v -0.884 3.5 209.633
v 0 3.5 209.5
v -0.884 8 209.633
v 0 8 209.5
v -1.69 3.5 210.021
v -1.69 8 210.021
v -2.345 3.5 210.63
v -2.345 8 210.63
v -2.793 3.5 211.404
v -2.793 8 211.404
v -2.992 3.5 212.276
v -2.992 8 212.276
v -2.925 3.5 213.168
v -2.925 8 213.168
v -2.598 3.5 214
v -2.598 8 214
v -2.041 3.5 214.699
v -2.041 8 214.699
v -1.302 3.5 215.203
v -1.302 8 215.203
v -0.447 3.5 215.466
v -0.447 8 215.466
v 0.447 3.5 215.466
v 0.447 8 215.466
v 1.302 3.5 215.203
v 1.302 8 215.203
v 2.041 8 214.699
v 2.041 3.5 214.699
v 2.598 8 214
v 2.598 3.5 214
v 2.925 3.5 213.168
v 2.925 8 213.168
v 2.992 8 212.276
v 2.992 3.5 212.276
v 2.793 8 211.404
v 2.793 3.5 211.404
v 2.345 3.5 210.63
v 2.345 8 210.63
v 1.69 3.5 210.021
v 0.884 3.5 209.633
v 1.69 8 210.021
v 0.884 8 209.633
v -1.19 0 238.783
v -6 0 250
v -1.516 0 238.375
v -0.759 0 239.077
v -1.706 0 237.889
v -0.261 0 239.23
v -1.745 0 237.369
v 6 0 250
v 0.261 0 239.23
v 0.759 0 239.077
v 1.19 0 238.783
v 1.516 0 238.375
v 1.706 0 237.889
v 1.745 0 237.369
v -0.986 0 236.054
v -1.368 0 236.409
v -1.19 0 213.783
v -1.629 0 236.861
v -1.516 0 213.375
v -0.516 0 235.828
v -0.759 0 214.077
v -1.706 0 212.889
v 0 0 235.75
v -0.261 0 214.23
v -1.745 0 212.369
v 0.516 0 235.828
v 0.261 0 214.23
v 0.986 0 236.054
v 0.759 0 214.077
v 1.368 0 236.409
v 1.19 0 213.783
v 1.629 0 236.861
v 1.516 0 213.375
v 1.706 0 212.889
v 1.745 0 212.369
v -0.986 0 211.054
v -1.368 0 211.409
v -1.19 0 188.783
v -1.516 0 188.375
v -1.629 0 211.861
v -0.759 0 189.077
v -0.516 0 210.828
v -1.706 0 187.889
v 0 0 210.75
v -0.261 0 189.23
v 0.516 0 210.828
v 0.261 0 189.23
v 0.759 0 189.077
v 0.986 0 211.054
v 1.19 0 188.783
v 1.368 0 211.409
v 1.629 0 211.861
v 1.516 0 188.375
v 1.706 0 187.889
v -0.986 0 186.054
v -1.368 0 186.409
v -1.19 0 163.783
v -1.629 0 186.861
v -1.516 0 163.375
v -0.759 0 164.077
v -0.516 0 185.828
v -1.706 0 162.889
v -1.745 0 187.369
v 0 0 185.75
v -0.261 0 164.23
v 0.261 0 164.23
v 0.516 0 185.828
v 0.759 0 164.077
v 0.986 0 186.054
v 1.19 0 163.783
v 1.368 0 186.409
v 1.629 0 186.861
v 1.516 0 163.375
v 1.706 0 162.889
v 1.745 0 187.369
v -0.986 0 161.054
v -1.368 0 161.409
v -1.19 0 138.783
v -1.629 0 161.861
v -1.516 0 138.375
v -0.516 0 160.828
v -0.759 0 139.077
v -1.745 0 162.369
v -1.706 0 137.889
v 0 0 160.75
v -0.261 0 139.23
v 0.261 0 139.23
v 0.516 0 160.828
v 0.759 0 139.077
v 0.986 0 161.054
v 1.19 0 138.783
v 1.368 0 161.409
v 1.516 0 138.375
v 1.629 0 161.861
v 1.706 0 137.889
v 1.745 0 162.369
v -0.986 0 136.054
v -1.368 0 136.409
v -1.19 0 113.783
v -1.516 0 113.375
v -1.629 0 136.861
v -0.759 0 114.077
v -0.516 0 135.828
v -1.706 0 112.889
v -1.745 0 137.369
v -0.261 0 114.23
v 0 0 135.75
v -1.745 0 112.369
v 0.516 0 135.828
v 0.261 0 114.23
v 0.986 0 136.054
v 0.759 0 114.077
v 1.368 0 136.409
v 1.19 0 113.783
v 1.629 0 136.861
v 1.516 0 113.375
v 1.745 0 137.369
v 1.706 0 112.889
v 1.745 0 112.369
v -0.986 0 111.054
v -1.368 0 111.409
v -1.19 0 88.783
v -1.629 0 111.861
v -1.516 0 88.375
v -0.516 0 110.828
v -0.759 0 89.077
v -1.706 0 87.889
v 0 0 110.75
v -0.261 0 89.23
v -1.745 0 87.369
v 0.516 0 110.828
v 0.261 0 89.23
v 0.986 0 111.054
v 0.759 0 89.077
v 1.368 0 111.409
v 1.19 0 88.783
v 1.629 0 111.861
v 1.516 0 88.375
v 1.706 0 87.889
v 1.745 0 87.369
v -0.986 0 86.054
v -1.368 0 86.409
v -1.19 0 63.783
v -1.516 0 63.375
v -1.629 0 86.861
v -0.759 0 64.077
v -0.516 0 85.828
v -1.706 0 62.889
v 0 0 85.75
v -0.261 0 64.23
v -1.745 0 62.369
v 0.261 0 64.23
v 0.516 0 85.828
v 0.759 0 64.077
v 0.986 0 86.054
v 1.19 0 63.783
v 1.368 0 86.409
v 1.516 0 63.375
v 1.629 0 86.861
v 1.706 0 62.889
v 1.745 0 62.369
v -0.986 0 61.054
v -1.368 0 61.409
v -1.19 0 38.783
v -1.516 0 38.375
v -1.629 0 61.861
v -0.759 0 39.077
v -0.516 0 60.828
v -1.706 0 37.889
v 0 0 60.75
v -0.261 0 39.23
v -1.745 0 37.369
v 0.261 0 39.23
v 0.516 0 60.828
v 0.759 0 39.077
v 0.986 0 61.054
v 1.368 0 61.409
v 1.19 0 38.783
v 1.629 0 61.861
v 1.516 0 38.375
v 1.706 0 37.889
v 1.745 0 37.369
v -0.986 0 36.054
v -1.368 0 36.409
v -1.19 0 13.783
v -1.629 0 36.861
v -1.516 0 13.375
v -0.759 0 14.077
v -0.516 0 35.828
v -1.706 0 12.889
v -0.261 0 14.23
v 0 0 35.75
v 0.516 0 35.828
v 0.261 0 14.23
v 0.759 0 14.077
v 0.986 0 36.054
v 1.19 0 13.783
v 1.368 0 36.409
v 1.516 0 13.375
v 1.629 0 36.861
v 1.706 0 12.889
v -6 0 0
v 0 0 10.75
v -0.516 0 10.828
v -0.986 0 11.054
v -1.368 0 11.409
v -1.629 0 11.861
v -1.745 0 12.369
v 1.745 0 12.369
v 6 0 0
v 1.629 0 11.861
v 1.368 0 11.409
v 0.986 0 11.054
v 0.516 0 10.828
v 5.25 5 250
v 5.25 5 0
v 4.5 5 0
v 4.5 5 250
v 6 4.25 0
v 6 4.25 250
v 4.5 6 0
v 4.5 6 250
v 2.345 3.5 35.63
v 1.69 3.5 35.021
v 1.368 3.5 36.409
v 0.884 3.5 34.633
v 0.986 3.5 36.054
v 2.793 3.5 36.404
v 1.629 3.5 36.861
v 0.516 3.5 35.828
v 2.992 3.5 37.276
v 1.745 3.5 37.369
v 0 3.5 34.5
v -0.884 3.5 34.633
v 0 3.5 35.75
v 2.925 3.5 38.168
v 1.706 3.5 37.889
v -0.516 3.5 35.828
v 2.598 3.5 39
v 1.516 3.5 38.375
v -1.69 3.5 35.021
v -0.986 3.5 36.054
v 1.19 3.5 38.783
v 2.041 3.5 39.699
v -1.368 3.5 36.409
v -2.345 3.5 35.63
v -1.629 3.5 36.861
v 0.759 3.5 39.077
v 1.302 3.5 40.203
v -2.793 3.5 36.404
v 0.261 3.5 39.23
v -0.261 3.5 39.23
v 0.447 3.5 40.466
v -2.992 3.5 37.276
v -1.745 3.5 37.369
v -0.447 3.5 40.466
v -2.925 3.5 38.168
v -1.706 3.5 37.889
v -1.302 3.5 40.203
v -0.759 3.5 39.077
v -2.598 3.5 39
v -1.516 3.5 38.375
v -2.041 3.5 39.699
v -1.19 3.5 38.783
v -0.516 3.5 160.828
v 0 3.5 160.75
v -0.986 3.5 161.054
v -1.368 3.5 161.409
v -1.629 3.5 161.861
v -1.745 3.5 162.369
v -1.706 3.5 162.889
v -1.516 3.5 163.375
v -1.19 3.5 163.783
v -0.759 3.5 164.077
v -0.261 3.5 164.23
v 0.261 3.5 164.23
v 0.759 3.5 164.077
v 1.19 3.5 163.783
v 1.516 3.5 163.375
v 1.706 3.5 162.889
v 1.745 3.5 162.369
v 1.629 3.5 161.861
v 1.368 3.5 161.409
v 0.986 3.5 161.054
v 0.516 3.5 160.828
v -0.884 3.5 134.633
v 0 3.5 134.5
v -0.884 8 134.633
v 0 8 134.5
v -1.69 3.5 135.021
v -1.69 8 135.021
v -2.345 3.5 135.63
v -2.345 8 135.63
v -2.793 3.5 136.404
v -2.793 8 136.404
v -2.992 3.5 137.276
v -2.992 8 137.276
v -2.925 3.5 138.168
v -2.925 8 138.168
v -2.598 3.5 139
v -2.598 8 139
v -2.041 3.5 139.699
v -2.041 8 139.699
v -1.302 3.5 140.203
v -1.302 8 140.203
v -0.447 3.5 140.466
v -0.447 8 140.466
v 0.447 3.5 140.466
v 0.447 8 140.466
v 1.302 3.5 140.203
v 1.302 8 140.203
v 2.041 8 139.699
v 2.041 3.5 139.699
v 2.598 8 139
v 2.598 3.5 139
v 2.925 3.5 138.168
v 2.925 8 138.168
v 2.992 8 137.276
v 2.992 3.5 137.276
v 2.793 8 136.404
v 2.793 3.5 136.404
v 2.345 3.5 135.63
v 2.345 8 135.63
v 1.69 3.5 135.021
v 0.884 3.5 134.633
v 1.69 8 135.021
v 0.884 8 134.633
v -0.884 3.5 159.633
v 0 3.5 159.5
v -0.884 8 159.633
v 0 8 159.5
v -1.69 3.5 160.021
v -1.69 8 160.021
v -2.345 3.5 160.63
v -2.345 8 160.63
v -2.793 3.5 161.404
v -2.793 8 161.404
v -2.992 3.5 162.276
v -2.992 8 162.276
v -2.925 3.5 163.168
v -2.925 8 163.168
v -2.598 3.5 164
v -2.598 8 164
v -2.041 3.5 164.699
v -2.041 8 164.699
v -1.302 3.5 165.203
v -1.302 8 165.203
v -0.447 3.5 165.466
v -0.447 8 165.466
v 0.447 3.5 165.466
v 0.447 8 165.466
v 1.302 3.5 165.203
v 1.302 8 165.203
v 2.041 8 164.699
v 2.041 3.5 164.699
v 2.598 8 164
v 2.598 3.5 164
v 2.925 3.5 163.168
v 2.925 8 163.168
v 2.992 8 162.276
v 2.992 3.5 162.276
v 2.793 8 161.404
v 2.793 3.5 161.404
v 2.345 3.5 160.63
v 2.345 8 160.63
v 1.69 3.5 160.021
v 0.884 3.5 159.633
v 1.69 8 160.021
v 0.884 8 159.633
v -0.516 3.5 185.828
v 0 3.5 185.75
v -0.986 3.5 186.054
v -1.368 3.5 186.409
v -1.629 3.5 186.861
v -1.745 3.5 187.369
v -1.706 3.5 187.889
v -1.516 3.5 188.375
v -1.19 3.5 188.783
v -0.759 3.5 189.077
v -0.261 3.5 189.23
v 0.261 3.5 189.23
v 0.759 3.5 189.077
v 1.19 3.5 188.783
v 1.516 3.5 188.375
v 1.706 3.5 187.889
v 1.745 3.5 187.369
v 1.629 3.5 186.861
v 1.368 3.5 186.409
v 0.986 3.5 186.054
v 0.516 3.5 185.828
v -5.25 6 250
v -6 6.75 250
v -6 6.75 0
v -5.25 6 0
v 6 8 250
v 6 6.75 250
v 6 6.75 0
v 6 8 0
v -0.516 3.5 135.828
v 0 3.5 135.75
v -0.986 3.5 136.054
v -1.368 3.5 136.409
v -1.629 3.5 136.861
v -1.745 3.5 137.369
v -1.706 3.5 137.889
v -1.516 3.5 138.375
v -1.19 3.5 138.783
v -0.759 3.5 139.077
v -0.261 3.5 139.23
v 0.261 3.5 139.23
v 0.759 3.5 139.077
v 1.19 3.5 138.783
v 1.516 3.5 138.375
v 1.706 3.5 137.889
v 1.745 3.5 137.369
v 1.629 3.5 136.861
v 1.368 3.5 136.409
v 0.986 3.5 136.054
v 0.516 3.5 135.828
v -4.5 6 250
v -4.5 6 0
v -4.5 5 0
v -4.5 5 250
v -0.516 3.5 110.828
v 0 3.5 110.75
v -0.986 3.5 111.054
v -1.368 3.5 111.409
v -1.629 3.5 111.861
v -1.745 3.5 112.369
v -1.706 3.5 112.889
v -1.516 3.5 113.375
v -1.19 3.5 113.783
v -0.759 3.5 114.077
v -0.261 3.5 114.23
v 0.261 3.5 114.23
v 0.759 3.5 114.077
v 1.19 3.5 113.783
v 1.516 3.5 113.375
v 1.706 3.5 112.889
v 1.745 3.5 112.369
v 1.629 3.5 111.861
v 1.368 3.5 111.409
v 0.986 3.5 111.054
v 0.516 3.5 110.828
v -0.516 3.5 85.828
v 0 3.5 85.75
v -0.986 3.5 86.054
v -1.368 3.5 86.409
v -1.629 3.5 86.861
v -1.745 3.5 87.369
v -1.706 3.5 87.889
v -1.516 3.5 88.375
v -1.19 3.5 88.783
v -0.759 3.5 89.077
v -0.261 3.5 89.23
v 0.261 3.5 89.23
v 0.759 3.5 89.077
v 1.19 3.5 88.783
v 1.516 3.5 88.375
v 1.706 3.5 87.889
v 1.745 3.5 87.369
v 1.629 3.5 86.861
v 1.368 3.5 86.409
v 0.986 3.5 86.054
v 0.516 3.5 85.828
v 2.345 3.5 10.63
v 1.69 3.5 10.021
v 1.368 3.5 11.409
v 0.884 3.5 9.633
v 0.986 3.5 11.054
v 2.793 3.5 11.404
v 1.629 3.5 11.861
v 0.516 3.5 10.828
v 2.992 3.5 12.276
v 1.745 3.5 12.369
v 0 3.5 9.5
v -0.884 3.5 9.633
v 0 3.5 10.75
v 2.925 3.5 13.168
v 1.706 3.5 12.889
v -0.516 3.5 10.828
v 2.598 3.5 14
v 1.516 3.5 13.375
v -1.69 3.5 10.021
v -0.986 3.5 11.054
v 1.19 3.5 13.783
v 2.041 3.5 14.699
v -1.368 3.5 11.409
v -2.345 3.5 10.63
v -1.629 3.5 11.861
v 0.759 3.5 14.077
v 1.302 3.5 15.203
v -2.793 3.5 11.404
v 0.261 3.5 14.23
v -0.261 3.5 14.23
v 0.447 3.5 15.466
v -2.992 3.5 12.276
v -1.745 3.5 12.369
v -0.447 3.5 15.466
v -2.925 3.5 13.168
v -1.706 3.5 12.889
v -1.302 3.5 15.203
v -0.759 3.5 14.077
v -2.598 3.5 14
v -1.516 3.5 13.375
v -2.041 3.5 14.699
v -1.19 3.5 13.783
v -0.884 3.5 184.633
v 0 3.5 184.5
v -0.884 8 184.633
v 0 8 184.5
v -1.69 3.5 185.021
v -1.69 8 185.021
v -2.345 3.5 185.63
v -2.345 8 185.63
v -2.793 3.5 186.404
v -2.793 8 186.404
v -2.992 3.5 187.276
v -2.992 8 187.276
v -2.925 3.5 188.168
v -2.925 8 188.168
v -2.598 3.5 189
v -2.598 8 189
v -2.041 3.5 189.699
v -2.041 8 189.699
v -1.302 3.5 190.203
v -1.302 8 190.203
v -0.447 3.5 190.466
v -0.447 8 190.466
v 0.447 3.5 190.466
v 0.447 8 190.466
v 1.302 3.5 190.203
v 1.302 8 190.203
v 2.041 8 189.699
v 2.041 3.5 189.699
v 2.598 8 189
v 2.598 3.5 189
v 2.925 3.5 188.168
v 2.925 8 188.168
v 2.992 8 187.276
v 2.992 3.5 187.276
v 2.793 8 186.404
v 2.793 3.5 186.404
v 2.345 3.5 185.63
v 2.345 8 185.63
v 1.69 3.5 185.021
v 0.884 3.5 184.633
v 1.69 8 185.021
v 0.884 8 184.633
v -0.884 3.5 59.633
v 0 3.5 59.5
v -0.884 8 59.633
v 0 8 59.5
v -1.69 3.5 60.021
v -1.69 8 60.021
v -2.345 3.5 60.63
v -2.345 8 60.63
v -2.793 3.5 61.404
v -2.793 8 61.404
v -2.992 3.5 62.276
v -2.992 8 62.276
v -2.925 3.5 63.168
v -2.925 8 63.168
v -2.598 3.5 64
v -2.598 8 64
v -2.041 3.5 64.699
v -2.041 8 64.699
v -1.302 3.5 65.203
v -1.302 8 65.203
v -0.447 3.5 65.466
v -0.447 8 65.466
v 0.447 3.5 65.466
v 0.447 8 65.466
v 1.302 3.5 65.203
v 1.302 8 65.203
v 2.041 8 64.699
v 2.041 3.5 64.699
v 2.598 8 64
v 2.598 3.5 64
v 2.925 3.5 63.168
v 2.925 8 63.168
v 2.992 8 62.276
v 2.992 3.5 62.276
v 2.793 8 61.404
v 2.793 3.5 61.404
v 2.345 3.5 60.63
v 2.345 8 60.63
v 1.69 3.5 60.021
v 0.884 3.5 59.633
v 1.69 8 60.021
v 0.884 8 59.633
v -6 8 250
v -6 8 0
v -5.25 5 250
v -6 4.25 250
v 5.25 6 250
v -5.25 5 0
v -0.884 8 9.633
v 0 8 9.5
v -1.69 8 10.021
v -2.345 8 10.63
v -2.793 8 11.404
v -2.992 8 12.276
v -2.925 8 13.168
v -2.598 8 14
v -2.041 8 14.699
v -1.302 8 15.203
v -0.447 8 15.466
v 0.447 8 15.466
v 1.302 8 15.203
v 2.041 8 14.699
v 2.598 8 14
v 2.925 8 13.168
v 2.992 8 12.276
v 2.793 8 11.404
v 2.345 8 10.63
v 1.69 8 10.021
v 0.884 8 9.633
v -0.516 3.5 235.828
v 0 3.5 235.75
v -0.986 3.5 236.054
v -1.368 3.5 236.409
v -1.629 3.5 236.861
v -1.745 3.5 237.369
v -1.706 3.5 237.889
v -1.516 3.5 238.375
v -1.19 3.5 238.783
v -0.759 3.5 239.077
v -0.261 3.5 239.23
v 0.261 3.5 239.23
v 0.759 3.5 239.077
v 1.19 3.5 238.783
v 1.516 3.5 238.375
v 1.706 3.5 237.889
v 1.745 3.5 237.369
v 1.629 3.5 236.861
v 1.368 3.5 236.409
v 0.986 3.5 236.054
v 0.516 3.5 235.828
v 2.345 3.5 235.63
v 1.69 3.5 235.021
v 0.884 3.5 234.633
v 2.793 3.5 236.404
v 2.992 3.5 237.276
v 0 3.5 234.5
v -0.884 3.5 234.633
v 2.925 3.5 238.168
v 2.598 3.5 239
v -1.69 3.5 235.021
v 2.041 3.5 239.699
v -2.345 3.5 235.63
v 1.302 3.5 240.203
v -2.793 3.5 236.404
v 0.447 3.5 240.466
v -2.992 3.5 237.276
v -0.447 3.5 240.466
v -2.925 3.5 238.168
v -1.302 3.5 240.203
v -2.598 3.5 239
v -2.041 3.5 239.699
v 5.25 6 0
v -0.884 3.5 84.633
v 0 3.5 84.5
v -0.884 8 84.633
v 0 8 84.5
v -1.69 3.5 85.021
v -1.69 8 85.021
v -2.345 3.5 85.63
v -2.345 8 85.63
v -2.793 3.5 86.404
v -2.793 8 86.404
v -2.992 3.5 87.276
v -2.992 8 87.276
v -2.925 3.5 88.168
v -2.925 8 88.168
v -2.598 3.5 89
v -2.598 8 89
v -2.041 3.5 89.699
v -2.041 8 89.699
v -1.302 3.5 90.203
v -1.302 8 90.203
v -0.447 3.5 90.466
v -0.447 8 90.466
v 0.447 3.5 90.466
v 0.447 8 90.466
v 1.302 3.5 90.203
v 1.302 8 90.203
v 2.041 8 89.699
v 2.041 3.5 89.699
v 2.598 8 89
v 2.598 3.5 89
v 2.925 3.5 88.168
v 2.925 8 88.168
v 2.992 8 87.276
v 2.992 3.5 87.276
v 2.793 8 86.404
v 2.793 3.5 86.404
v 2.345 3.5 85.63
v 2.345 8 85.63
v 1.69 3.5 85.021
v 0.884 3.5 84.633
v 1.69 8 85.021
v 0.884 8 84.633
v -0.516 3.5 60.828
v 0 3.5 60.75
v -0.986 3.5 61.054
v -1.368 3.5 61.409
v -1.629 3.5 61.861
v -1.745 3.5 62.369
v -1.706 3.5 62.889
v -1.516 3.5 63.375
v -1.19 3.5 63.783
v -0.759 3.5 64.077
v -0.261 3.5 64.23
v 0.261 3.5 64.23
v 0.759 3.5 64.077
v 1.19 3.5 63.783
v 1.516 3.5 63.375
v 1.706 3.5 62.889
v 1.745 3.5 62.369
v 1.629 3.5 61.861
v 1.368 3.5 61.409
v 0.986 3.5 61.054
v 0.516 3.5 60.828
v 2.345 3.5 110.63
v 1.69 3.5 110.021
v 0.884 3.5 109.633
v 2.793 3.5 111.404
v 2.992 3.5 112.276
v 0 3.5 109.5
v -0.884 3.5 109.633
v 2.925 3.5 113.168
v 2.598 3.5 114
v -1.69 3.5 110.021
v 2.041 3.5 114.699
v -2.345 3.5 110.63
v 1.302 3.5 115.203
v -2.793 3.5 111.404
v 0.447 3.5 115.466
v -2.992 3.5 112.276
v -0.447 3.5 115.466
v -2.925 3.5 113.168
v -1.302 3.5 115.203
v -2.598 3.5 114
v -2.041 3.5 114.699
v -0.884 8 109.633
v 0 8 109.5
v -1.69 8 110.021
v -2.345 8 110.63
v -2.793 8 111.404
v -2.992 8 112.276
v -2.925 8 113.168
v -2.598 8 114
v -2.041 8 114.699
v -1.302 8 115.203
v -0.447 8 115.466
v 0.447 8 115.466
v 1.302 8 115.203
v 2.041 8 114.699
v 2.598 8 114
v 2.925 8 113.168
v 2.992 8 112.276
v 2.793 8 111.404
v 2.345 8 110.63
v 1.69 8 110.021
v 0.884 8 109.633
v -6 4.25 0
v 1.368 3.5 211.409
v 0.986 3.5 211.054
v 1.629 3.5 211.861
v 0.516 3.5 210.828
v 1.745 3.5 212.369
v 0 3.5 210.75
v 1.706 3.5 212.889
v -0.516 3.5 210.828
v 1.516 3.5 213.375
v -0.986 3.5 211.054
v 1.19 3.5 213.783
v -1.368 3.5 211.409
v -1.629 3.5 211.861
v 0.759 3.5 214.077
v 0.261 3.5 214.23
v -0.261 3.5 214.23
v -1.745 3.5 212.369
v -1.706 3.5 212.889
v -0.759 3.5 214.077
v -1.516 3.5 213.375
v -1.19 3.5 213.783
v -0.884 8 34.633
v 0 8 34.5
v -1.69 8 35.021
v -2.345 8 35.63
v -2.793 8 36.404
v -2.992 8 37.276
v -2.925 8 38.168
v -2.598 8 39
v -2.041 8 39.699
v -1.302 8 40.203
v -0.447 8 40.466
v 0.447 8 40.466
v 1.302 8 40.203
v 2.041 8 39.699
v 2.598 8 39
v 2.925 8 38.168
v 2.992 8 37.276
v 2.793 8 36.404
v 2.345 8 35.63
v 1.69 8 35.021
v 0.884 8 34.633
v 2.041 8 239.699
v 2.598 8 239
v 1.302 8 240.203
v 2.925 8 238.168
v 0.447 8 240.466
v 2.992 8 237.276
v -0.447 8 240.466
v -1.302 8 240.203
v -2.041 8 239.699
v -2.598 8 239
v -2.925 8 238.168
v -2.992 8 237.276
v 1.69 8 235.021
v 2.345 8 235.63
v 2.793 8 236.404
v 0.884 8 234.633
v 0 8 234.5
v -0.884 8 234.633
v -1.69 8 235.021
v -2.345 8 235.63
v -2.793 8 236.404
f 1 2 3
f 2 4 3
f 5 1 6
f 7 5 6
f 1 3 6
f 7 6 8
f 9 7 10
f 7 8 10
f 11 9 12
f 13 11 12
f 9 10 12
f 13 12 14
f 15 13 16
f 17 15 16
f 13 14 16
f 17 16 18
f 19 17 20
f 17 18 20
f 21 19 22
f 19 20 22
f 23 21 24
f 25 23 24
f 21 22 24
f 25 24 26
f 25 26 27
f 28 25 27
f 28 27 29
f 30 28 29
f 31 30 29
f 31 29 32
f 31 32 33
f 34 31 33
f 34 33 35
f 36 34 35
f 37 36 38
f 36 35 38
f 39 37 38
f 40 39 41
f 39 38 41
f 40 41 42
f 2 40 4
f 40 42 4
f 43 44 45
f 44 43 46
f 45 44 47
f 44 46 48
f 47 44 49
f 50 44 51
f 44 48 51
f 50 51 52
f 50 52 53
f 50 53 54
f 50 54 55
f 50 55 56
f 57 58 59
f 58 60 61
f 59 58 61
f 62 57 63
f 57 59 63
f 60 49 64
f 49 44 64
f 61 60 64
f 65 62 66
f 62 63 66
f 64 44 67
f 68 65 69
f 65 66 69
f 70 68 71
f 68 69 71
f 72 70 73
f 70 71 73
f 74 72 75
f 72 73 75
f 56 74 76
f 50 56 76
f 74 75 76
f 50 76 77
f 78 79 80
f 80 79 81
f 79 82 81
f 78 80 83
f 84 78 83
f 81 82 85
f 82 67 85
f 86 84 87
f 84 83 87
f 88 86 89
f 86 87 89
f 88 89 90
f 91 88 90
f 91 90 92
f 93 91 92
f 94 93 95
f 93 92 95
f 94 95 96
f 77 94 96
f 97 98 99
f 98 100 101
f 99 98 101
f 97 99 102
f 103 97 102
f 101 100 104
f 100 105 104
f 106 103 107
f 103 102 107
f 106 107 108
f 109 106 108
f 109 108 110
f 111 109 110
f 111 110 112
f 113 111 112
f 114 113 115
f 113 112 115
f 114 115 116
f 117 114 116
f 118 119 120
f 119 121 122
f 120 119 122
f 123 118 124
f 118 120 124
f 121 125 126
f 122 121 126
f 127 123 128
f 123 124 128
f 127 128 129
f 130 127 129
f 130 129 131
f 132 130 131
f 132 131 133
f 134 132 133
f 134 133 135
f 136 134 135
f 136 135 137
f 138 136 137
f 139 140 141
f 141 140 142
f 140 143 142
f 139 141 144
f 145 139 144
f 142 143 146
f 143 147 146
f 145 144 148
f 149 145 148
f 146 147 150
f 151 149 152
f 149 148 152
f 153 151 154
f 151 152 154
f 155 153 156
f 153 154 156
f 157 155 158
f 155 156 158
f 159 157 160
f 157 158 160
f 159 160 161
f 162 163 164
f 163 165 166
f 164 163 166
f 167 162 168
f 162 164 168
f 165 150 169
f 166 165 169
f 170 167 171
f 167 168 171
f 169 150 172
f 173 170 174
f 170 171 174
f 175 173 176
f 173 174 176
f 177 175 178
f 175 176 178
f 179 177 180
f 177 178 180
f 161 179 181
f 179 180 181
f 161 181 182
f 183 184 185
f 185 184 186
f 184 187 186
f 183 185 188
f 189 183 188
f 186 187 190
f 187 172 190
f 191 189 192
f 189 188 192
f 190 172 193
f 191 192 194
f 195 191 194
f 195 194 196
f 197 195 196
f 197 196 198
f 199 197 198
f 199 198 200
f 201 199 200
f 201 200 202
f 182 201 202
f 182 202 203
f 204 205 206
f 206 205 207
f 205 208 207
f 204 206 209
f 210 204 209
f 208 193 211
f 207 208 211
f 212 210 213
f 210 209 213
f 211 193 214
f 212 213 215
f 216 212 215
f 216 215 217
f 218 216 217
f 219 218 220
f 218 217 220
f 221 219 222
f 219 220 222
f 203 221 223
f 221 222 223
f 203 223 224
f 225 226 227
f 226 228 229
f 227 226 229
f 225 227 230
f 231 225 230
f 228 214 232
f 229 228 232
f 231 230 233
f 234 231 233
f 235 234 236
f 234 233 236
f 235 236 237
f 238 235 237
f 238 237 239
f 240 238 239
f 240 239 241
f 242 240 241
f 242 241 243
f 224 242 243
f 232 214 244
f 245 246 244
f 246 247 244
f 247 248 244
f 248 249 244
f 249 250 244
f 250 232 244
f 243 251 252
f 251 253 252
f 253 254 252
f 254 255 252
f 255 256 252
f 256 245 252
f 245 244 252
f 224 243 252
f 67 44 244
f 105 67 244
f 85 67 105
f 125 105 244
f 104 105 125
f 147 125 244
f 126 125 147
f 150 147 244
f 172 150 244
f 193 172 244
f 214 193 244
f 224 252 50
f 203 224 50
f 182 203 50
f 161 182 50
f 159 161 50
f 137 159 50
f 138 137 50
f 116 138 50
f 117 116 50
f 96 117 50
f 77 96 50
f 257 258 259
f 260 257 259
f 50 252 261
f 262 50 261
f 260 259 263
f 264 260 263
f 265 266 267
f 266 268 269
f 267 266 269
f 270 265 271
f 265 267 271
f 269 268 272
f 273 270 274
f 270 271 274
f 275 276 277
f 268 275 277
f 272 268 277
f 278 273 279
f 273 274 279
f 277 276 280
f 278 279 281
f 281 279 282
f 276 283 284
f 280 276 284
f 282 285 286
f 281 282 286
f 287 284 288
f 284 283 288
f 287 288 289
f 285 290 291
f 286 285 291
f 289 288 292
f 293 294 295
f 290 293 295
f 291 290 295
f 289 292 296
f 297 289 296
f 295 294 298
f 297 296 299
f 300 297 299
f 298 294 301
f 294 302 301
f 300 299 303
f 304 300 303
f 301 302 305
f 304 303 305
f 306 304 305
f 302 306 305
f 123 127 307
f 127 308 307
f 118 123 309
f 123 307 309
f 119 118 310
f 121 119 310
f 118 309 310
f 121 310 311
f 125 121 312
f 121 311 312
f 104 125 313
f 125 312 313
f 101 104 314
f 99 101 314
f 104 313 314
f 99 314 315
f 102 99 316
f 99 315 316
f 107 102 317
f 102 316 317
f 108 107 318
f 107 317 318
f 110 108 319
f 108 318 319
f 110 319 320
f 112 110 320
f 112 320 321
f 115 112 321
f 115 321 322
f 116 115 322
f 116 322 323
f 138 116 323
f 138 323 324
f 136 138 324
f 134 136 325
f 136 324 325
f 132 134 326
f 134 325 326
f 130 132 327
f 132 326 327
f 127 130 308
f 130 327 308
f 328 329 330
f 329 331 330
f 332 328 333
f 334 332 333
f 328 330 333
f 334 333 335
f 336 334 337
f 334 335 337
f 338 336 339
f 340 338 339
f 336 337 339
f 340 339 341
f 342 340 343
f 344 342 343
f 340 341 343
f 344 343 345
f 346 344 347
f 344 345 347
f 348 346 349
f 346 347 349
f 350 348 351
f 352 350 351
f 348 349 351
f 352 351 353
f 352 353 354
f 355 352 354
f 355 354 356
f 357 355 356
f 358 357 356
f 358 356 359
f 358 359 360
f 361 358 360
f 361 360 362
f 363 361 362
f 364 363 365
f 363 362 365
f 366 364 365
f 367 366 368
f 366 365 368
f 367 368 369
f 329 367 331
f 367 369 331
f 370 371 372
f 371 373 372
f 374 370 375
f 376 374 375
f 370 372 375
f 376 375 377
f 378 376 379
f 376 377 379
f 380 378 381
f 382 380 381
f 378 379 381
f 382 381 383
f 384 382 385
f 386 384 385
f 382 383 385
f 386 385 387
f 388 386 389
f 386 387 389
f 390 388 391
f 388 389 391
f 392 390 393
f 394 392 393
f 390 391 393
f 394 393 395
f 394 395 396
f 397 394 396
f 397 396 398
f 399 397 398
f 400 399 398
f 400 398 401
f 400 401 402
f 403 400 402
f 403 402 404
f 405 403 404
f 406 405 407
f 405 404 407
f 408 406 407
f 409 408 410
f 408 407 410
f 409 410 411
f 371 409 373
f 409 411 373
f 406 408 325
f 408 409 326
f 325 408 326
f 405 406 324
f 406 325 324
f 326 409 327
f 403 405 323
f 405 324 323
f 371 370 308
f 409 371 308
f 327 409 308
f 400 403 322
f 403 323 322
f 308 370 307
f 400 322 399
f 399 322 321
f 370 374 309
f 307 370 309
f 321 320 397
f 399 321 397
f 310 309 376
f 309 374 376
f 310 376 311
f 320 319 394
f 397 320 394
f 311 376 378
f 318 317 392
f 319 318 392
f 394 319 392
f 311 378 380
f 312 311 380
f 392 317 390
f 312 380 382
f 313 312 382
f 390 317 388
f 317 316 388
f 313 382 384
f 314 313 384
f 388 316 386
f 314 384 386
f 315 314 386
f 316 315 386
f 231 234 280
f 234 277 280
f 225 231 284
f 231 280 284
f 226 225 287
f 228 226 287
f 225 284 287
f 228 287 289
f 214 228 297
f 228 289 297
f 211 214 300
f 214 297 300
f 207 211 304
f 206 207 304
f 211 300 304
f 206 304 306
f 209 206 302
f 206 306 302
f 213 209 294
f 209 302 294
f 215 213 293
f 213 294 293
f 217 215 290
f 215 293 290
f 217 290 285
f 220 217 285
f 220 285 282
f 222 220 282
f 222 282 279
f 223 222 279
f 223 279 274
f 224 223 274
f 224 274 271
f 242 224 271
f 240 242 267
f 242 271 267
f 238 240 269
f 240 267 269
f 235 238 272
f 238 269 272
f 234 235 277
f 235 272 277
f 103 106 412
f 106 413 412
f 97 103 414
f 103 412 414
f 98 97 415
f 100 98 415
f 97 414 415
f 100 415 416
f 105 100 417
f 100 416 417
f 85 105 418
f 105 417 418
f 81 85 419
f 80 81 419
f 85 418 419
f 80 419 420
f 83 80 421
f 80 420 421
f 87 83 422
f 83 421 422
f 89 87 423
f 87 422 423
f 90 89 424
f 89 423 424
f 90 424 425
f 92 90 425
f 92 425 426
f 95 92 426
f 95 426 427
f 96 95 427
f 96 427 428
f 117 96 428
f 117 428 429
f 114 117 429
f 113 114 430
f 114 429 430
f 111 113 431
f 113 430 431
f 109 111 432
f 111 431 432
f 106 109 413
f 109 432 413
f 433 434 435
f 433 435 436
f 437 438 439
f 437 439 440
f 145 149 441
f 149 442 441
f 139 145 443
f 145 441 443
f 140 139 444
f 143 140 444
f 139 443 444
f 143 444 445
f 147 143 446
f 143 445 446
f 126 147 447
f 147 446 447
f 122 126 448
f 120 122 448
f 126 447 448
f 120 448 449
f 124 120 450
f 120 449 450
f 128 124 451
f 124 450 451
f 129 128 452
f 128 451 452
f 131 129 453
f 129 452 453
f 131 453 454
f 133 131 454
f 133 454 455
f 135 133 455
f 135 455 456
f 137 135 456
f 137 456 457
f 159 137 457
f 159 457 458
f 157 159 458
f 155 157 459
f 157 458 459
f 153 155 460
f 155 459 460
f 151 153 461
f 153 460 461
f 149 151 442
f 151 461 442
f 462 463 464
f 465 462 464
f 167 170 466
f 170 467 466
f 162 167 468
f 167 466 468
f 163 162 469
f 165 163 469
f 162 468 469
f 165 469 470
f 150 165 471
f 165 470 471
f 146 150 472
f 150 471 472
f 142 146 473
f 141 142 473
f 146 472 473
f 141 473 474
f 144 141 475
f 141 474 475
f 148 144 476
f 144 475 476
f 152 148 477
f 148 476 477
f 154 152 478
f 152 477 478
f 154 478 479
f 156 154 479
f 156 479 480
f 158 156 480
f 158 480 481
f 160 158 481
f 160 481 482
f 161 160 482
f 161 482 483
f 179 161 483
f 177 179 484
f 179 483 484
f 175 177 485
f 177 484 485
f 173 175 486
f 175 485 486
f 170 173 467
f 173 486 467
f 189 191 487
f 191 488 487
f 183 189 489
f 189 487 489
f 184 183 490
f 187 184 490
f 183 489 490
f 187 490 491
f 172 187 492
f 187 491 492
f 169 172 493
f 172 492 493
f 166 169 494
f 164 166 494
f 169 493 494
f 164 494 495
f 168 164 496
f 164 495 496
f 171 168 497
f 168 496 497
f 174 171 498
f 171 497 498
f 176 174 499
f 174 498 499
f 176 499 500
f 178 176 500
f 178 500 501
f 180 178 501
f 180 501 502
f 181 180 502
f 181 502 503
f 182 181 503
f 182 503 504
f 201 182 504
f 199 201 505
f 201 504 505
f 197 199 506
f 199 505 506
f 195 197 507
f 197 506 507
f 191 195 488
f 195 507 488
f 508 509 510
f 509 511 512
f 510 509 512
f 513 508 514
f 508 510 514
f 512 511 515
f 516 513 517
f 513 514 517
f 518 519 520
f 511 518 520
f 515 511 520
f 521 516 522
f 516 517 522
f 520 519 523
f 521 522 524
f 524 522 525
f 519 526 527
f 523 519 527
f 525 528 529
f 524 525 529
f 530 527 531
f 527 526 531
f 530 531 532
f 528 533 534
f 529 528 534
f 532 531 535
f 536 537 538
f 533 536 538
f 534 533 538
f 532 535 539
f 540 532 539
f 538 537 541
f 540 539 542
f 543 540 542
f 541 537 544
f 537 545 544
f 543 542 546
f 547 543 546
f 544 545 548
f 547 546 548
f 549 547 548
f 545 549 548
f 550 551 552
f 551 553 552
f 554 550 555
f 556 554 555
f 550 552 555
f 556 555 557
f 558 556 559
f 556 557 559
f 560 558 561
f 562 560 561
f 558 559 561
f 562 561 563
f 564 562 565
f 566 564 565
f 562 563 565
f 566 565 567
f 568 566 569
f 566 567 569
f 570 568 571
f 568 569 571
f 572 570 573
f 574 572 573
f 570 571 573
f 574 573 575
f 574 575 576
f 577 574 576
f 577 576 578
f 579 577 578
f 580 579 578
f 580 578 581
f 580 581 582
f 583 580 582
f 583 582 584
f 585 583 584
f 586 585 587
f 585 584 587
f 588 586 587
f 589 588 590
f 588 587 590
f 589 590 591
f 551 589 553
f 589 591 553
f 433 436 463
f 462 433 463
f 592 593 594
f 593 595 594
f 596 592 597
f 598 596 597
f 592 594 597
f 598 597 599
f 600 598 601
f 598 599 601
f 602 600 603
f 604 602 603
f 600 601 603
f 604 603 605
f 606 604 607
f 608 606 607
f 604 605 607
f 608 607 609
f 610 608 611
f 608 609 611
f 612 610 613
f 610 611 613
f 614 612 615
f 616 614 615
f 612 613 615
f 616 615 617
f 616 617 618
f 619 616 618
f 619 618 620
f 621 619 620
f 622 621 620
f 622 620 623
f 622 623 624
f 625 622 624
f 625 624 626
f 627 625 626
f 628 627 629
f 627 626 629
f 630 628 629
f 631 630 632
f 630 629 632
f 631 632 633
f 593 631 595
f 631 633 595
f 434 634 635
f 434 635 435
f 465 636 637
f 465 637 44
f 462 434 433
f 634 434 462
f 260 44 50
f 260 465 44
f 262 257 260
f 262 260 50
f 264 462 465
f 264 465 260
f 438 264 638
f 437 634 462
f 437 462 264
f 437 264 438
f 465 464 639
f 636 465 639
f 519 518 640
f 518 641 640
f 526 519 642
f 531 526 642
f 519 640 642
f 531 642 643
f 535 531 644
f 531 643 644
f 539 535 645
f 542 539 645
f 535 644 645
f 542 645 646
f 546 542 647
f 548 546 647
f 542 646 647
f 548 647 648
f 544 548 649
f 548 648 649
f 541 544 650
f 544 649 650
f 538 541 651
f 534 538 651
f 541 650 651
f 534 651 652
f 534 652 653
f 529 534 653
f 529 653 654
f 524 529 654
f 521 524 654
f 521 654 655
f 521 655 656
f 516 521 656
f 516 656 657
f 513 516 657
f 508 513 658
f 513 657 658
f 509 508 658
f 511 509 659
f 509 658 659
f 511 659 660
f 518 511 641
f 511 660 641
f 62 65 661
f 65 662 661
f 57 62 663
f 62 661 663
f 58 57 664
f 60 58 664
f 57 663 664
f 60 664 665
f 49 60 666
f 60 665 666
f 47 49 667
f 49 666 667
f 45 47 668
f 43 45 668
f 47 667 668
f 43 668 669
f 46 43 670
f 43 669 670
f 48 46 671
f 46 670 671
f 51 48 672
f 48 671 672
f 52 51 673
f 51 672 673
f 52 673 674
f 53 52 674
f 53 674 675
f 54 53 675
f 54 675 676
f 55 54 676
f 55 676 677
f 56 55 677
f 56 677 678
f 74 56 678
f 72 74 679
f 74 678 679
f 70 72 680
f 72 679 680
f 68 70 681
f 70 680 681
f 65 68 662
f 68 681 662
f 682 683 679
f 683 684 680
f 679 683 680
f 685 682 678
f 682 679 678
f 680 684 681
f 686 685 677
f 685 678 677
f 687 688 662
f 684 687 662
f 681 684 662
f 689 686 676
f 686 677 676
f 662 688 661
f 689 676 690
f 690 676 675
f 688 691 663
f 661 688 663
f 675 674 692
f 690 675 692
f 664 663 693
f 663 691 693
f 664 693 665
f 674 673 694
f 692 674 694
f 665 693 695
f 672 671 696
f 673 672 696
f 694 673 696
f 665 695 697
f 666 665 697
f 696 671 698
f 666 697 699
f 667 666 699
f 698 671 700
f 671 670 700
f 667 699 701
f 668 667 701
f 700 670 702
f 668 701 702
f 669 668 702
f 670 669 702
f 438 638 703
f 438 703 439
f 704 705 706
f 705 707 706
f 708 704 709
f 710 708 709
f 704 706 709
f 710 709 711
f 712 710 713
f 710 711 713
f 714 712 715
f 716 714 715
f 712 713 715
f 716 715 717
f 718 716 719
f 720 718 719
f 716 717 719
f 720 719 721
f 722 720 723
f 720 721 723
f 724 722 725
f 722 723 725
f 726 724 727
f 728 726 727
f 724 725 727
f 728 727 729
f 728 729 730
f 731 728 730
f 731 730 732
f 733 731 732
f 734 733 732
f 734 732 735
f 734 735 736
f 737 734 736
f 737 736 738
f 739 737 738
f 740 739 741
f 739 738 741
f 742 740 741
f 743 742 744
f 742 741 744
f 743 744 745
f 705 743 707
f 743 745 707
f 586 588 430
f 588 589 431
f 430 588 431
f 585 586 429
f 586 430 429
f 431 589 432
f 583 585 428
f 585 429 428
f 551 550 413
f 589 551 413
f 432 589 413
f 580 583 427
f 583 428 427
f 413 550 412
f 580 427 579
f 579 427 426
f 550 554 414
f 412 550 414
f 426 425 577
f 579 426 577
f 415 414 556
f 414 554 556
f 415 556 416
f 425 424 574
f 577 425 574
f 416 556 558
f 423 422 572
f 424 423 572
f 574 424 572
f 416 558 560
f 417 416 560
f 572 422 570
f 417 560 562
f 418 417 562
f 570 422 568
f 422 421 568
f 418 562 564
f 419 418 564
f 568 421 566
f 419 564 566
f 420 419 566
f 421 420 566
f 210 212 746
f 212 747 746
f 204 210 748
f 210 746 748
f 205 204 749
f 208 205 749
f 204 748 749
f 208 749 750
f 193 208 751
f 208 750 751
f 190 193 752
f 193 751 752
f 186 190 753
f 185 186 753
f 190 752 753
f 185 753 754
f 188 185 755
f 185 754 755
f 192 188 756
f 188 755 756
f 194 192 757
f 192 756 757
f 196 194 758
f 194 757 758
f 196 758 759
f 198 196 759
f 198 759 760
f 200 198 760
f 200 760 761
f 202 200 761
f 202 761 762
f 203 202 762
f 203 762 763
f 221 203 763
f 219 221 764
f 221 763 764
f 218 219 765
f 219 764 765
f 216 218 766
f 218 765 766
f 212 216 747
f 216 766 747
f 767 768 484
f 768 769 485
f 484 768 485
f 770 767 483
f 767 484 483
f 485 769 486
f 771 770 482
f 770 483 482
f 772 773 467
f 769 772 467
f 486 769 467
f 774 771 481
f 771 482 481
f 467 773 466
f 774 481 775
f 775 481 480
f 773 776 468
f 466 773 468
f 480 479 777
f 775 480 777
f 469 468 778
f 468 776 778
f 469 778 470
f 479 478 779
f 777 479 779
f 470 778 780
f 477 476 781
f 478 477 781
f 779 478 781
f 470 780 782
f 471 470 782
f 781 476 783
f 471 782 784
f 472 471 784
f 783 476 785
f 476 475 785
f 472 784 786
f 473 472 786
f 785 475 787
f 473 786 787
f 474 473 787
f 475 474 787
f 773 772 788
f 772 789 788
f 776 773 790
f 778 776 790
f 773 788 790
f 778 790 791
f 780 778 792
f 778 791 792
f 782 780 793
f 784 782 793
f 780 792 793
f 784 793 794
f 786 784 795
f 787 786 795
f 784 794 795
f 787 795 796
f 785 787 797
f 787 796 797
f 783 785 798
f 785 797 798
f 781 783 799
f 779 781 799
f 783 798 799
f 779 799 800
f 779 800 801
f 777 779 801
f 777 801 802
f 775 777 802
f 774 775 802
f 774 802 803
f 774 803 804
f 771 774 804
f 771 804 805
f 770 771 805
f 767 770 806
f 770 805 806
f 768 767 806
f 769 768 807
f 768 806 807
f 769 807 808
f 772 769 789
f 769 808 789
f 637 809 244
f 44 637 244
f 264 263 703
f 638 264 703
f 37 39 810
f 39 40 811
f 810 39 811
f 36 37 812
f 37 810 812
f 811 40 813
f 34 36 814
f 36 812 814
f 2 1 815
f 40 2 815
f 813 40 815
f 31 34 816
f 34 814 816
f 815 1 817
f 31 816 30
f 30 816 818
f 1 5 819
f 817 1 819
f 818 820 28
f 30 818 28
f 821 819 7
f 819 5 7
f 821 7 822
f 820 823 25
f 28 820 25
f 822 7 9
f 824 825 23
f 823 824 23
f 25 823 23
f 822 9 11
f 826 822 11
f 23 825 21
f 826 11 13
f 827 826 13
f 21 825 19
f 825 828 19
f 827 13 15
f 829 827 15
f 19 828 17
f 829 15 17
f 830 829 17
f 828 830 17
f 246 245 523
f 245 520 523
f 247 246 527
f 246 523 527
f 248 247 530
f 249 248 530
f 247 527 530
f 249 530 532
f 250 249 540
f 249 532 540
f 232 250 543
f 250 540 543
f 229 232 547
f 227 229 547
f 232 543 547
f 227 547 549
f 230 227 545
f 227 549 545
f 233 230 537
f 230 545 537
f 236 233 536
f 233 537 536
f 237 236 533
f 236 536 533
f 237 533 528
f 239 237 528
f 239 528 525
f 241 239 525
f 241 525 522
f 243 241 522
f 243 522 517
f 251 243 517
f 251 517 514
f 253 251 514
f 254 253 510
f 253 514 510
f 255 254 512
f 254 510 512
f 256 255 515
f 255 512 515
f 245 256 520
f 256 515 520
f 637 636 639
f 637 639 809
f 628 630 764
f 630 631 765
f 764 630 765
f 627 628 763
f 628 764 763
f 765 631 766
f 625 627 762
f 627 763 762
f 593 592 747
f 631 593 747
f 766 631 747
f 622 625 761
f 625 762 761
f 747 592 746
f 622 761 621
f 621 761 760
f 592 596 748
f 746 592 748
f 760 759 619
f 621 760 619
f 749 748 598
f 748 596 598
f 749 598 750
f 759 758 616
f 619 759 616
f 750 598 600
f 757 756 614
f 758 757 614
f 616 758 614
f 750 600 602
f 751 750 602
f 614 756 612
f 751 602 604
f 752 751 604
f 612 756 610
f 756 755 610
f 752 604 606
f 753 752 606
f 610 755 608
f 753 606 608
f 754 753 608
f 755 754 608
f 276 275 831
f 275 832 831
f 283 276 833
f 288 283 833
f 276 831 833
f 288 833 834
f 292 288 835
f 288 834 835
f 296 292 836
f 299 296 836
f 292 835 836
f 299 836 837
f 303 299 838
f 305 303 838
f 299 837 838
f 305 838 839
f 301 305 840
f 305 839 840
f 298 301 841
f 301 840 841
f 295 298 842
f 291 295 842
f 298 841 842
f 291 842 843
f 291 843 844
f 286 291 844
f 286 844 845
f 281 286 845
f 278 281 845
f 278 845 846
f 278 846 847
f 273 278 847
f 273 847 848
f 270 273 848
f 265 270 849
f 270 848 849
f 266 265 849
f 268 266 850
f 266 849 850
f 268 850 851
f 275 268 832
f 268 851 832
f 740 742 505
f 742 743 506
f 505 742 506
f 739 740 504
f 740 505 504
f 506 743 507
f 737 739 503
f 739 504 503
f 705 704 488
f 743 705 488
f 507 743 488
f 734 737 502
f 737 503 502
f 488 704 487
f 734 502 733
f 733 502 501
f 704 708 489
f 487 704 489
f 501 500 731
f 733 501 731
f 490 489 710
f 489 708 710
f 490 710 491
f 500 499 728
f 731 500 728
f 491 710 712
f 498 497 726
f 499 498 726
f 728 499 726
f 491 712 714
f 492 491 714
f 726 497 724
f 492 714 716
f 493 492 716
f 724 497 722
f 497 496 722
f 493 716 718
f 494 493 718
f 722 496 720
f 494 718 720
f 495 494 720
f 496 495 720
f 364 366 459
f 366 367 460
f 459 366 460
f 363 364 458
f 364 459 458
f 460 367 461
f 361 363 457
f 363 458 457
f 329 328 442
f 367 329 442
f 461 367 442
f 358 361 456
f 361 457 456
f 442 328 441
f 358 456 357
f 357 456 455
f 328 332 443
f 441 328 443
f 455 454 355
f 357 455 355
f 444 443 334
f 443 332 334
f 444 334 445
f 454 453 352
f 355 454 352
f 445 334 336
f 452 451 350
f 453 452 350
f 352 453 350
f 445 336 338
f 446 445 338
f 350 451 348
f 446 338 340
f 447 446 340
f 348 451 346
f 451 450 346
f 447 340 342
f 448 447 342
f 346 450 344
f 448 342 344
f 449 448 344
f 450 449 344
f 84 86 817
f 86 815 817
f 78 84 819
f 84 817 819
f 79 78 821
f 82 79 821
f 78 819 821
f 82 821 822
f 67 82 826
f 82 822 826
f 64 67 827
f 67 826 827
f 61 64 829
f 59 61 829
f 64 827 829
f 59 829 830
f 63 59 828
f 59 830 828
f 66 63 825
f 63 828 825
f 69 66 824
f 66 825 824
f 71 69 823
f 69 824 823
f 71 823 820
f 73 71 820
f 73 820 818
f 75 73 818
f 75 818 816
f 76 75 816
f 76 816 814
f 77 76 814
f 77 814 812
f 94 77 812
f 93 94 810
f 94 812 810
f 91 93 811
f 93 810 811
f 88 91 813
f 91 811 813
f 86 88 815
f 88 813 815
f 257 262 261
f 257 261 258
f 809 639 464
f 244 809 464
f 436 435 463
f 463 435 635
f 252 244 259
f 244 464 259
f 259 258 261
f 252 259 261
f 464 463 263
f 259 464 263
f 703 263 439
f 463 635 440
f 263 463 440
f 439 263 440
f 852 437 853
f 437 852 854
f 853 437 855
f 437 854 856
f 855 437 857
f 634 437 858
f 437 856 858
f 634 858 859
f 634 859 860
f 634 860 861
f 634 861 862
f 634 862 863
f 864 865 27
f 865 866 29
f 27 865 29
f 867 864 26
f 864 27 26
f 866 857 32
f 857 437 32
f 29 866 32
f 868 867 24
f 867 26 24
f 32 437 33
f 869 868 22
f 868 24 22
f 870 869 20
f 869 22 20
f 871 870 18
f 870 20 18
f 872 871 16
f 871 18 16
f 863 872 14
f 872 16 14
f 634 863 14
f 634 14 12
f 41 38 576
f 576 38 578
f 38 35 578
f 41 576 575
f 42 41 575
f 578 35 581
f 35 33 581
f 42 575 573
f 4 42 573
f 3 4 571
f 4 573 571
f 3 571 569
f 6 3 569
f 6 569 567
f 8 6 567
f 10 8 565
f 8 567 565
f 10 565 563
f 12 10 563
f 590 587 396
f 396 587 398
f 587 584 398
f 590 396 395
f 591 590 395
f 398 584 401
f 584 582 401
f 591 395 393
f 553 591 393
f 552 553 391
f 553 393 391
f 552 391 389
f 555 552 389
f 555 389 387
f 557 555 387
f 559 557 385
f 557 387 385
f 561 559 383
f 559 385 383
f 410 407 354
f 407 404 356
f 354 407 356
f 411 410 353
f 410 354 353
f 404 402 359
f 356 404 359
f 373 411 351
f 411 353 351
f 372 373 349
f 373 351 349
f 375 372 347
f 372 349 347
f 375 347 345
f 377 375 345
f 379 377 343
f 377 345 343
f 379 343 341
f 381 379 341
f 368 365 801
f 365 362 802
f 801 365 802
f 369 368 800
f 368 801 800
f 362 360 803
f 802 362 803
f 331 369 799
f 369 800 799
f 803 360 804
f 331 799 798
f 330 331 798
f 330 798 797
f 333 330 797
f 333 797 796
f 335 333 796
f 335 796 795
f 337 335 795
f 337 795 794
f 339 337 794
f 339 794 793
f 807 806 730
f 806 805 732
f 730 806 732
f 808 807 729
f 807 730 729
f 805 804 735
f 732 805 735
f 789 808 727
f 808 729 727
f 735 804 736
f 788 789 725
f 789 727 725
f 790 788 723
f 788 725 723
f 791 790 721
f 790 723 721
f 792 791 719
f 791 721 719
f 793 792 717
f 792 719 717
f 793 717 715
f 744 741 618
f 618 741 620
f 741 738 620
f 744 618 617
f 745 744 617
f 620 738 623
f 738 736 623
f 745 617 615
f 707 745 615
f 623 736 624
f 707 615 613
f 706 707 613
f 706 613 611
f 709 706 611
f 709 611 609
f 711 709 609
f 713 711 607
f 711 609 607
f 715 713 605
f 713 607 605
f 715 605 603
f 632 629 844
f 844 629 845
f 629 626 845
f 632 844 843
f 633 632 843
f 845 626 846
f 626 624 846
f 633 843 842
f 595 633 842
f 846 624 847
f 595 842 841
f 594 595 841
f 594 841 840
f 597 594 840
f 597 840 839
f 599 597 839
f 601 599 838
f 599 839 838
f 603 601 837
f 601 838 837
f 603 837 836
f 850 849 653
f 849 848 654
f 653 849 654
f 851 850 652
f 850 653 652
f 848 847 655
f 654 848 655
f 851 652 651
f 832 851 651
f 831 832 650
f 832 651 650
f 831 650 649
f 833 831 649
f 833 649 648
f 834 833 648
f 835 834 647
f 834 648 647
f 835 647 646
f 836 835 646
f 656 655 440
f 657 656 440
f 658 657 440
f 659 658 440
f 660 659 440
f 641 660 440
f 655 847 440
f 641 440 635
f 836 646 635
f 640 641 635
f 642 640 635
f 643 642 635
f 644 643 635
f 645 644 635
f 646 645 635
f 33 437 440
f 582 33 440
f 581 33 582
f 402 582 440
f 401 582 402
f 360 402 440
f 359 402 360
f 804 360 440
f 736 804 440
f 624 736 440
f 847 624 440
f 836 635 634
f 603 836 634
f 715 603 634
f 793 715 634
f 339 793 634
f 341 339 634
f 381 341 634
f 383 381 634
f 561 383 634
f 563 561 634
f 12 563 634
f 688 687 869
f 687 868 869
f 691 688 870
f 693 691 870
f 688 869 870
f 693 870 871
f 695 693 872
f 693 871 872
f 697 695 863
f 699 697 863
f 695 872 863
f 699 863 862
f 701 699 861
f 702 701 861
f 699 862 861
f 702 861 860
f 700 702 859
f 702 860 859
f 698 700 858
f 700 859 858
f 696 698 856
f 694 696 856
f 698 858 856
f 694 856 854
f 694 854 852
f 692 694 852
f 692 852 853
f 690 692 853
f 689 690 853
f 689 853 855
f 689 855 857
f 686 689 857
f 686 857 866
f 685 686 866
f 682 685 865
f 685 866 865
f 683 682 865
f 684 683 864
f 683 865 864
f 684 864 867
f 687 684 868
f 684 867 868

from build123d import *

# Parameters (mm, degrees)
BOSS_EXTRUDE1_DEPTH = 250
LPATTERN1_COUNT     = 10
LPATTERN1_PITCH     = 25


with BuildPart() as part:
    # Sketch1 → Boss-Extrude1 (new body)
    with BuildSketch(Plane.XY):
        Polygon((-6, 0), (6, 0), (6, 4.25), (5.25, 5), (4.5, 5), (4.5, 6), (5.25, 6), (6, 6.75), (6, 8), (-6, 8), (-6, 6.75), (-5.25, 6), (-4.5, 6), (-4.5, 5), (-5.25, 5), (-6, 4.25), align=None)
    extrude(amount=BOSS_EXTRUDE1_DEPTH)

    # Sketch2 → Cut-Revolve3 (revolve, cut)
    with BuildSketch(Plane(origin=(0, 0, 0), x_dir=(0, 0, -1), z_dir=(1, 0, 0))):
        Polygon((-10.75, 0), (-10.75, 3.5), (-9.5, 3.5), (-9.5, 8), (-12.5, 8), (-12.5, 0), align=None)
    cut_revolve3 = revolve(axis=Axis((0, 0, 12.5), (0, 1, 0)), mode=Mode.SUBTRACT)

    # LPattern1: Cut-Revolve3 ×10
    with Locations(*[(0, 0, i * LPATTERN1_PITCH) for i in range(1, LPATTERN1_COUNT)]):
        add(cut_revolve3, mode=Mode.SUBTRACT)


solid = part.part
